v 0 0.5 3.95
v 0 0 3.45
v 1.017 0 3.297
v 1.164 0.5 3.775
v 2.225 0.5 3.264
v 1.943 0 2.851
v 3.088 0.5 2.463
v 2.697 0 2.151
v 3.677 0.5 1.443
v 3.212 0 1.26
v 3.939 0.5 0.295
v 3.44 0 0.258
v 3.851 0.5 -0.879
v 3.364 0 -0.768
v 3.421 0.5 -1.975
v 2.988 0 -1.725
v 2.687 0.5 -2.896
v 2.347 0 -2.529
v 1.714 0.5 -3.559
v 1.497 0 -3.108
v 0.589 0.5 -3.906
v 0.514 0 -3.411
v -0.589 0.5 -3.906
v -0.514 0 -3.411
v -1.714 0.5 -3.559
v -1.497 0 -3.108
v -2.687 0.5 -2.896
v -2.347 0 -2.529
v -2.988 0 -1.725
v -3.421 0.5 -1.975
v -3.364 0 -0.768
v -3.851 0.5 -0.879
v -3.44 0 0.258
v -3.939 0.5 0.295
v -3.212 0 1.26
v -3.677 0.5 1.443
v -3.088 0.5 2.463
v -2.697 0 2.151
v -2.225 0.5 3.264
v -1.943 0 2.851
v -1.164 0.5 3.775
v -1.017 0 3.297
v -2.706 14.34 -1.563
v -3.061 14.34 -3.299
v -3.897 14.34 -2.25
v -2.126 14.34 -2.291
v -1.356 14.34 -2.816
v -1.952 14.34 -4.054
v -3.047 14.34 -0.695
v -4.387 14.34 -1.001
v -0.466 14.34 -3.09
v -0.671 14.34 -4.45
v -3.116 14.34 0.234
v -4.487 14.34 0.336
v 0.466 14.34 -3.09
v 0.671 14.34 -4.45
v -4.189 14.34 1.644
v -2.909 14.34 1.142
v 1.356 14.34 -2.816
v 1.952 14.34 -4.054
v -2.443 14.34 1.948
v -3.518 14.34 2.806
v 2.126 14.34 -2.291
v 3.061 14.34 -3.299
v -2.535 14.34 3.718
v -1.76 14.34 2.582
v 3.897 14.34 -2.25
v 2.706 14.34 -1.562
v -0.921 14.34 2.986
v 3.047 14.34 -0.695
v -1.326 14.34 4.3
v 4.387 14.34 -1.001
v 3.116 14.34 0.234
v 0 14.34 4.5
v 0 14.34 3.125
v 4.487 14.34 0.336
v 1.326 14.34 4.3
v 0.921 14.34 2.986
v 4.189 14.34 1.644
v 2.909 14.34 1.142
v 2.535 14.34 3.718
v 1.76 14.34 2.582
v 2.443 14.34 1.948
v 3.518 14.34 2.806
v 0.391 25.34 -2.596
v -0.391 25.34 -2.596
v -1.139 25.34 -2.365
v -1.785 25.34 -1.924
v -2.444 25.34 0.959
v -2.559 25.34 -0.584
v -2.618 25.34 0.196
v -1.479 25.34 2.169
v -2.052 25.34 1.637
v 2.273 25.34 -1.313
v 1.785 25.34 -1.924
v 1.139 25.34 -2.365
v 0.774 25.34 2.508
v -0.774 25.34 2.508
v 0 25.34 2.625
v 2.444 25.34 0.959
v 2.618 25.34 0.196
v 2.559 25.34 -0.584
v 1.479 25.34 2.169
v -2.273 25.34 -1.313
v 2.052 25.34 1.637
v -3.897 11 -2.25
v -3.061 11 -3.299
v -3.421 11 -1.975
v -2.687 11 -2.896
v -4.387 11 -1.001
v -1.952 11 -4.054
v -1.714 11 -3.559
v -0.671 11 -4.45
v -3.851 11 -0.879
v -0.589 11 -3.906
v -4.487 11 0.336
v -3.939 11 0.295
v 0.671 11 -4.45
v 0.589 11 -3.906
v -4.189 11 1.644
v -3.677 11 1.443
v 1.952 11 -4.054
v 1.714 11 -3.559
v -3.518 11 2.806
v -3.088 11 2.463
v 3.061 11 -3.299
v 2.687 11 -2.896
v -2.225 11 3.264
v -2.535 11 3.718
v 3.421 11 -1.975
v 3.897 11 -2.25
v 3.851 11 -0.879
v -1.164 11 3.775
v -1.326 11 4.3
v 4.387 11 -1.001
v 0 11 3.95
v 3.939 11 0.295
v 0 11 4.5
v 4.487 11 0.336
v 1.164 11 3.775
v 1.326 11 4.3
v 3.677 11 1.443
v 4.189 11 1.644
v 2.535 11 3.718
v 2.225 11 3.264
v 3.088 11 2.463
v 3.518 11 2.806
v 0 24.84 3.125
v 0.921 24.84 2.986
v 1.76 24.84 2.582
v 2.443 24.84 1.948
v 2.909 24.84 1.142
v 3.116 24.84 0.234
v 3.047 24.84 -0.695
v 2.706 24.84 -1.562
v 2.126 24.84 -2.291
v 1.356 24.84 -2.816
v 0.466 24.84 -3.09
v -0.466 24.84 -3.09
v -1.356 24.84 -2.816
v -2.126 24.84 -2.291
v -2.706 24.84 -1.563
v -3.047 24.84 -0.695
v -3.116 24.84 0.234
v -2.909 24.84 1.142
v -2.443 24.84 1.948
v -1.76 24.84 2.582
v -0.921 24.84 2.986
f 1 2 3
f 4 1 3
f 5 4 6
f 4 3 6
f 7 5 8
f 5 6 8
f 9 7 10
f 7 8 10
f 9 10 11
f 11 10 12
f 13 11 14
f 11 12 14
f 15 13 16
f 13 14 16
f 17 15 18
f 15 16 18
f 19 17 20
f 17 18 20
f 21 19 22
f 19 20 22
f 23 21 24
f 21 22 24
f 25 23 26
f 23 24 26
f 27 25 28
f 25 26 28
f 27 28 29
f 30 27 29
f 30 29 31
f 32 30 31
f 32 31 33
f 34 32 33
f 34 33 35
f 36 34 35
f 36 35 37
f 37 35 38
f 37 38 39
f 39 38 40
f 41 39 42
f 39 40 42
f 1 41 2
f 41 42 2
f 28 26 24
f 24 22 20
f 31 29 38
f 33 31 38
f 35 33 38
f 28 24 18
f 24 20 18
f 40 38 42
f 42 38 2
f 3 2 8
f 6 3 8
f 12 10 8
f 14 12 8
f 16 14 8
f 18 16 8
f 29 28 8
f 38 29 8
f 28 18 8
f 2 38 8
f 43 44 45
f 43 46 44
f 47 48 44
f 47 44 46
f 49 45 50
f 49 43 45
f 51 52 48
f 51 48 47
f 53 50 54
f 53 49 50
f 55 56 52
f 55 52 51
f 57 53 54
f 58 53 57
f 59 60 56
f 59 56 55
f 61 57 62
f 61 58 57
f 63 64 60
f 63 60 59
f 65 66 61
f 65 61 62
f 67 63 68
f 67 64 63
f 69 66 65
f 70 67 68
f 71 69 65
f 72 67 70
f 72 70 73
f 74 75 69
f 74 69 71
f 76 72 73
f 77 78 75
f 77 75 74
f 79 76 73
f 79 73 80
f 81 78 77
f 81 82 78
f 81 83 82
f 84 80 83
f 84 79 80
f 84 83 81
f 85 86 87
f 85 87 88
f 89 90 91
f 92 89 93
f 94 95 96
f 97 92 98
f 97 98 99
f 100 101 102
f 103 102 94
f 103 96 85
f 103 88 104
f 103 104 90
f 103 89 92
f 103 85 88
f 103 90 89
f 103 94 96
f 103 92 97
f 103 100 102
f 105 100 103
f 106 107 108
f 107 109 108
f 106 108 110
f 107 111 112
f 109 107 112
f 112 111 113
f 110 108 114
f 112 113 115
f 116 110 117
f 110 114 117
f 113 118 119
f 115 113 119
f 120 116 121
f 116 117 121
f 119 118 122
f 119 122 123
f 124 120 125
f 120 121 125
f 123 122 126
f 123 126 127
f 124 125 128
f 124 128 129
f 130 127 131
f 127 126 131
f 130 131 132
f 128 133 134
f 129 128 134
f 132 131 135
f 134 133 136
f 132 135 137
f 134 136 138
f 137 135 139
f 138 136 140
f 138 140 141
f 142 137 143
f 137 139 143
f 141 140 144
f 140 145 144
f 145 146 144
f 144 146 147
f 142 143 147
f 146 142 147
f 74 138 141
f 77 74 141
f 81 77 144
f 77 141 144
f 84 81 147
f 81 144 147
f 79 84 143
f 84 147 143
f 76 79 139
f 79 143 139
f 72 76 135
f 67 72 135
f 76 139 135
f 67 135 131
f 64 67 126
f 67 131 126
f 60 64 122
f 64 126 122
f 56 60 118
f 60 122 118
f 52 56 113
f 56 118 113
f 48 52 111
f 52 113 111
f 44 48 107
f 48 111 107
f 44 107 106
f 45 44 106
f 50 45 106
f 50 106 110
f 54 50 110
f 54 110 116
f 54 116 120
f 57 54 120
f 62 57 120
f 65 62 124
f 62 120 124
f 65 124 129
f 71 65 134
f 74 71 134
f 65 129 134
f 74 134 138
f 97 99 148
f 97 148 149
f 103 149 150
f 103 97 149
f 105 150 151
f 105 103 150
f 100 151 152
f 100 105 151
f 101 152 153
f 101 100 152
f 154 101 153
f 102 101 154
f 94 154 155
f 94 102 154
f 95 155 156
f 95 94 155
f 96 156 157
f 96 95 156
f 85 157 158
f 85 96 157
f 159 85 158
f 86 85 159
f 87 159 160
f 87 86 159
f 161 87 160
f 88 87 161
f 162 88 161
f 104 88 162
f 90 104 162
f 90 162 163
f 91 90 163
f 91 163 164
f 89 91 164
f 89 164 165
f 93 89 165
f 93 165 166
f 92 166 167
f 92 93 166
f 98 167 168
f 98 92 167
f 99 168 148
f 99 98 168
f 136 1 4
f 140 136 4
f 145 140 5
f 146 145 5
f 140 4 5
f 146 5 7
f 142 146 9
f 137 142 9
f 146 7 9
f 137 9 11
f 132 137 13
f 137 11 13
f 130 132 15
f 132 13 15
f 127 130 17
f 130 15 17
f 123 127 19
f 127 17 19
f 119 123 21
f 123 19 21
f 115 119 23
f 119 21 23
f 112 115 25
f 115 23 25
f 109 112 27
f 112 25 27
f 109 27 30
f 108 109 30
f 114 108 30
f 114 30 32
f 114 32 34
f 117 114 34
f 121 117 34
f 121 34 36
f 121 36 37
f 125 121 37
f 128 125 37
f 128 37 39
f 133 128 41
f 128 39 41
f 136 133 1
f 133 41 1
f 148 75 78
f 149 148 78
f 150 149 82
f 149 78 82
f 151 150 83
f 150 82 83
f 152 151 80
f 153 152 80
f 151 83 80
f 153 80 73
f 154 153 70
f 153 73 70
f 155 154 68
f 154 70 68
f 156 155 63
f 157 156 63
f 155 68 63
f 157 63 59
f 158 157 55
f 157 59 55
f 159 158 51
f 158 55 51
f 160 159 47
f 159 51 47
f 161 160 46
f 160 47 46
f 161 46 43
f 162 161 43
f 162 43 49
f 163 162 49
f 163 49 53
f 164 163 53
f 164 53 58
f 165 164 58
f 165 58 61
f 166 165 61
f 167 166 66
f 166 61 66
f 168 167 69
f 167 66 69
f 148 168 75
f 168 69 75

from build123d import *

# Parameters (mm, degrees)
SKETCH1_R           = 3.95
BOSS_EXTRUDE1_DEPTH = 11
SKETCH2_R           = 4.5
BOSS_EXTRUDE2_DEPTH = 3.34
SKETCH4_R           = 3.125
BOSS_EXTRUDE3_DEPTH = 11
CHAMFER1_SIZE       = 0.5


with BuildPart() as part:
    # Sketch1 → Boss-Extrude1 (new body)
    with BuildSketch(Plane(origin=(0, 0, 0), x_dir=(1, 0, 0), z_dir=(0, 1, 0))):
        with Locations(Location((0, 0, 0), (0, 0, 270))):
            Circle(SKETCH1_R)
    extrude(amount=BOSS_EXTRUDE1_DEPTH)

    # Sketch2 → Boss-Extrude2 (add)
    with BuildSketch(Plane(origin=(0, 11, 0), x_dir=(1, 0, 0), z_dir=(0, 1, 0))):
        with Locations(Location((0, 0, 0), (0, 0, 270))):
            Circle(SKETCH2_R)
    extrude(amount=BOSS_EXTRUDE2_DEPTH)

    # Sketch4 → Boss-Extrude3 (add)
    with BuildSketch(Plane(origin=(0, 14.34, 0), x_dir=(1, 0, 0), z_dir=(0, 1, 0))):
        with Locations(Location((0, 0, 0), (0, 0, 270))):
            Circle(SKETCH4_R)
    extrude(amount=BOSS_EXTRUDE3_DEPTH)

    # Chamfer1
    chamfer1_edges = [part.edges().sort_by_distance(p)[0] for p in [
        (0, 25.34, -3.125),
        (0, 0, -3.95),
    ]]
    chamfer(chamfer1_edges, length=CHAMFER1_SIZE)


solid = part.part
